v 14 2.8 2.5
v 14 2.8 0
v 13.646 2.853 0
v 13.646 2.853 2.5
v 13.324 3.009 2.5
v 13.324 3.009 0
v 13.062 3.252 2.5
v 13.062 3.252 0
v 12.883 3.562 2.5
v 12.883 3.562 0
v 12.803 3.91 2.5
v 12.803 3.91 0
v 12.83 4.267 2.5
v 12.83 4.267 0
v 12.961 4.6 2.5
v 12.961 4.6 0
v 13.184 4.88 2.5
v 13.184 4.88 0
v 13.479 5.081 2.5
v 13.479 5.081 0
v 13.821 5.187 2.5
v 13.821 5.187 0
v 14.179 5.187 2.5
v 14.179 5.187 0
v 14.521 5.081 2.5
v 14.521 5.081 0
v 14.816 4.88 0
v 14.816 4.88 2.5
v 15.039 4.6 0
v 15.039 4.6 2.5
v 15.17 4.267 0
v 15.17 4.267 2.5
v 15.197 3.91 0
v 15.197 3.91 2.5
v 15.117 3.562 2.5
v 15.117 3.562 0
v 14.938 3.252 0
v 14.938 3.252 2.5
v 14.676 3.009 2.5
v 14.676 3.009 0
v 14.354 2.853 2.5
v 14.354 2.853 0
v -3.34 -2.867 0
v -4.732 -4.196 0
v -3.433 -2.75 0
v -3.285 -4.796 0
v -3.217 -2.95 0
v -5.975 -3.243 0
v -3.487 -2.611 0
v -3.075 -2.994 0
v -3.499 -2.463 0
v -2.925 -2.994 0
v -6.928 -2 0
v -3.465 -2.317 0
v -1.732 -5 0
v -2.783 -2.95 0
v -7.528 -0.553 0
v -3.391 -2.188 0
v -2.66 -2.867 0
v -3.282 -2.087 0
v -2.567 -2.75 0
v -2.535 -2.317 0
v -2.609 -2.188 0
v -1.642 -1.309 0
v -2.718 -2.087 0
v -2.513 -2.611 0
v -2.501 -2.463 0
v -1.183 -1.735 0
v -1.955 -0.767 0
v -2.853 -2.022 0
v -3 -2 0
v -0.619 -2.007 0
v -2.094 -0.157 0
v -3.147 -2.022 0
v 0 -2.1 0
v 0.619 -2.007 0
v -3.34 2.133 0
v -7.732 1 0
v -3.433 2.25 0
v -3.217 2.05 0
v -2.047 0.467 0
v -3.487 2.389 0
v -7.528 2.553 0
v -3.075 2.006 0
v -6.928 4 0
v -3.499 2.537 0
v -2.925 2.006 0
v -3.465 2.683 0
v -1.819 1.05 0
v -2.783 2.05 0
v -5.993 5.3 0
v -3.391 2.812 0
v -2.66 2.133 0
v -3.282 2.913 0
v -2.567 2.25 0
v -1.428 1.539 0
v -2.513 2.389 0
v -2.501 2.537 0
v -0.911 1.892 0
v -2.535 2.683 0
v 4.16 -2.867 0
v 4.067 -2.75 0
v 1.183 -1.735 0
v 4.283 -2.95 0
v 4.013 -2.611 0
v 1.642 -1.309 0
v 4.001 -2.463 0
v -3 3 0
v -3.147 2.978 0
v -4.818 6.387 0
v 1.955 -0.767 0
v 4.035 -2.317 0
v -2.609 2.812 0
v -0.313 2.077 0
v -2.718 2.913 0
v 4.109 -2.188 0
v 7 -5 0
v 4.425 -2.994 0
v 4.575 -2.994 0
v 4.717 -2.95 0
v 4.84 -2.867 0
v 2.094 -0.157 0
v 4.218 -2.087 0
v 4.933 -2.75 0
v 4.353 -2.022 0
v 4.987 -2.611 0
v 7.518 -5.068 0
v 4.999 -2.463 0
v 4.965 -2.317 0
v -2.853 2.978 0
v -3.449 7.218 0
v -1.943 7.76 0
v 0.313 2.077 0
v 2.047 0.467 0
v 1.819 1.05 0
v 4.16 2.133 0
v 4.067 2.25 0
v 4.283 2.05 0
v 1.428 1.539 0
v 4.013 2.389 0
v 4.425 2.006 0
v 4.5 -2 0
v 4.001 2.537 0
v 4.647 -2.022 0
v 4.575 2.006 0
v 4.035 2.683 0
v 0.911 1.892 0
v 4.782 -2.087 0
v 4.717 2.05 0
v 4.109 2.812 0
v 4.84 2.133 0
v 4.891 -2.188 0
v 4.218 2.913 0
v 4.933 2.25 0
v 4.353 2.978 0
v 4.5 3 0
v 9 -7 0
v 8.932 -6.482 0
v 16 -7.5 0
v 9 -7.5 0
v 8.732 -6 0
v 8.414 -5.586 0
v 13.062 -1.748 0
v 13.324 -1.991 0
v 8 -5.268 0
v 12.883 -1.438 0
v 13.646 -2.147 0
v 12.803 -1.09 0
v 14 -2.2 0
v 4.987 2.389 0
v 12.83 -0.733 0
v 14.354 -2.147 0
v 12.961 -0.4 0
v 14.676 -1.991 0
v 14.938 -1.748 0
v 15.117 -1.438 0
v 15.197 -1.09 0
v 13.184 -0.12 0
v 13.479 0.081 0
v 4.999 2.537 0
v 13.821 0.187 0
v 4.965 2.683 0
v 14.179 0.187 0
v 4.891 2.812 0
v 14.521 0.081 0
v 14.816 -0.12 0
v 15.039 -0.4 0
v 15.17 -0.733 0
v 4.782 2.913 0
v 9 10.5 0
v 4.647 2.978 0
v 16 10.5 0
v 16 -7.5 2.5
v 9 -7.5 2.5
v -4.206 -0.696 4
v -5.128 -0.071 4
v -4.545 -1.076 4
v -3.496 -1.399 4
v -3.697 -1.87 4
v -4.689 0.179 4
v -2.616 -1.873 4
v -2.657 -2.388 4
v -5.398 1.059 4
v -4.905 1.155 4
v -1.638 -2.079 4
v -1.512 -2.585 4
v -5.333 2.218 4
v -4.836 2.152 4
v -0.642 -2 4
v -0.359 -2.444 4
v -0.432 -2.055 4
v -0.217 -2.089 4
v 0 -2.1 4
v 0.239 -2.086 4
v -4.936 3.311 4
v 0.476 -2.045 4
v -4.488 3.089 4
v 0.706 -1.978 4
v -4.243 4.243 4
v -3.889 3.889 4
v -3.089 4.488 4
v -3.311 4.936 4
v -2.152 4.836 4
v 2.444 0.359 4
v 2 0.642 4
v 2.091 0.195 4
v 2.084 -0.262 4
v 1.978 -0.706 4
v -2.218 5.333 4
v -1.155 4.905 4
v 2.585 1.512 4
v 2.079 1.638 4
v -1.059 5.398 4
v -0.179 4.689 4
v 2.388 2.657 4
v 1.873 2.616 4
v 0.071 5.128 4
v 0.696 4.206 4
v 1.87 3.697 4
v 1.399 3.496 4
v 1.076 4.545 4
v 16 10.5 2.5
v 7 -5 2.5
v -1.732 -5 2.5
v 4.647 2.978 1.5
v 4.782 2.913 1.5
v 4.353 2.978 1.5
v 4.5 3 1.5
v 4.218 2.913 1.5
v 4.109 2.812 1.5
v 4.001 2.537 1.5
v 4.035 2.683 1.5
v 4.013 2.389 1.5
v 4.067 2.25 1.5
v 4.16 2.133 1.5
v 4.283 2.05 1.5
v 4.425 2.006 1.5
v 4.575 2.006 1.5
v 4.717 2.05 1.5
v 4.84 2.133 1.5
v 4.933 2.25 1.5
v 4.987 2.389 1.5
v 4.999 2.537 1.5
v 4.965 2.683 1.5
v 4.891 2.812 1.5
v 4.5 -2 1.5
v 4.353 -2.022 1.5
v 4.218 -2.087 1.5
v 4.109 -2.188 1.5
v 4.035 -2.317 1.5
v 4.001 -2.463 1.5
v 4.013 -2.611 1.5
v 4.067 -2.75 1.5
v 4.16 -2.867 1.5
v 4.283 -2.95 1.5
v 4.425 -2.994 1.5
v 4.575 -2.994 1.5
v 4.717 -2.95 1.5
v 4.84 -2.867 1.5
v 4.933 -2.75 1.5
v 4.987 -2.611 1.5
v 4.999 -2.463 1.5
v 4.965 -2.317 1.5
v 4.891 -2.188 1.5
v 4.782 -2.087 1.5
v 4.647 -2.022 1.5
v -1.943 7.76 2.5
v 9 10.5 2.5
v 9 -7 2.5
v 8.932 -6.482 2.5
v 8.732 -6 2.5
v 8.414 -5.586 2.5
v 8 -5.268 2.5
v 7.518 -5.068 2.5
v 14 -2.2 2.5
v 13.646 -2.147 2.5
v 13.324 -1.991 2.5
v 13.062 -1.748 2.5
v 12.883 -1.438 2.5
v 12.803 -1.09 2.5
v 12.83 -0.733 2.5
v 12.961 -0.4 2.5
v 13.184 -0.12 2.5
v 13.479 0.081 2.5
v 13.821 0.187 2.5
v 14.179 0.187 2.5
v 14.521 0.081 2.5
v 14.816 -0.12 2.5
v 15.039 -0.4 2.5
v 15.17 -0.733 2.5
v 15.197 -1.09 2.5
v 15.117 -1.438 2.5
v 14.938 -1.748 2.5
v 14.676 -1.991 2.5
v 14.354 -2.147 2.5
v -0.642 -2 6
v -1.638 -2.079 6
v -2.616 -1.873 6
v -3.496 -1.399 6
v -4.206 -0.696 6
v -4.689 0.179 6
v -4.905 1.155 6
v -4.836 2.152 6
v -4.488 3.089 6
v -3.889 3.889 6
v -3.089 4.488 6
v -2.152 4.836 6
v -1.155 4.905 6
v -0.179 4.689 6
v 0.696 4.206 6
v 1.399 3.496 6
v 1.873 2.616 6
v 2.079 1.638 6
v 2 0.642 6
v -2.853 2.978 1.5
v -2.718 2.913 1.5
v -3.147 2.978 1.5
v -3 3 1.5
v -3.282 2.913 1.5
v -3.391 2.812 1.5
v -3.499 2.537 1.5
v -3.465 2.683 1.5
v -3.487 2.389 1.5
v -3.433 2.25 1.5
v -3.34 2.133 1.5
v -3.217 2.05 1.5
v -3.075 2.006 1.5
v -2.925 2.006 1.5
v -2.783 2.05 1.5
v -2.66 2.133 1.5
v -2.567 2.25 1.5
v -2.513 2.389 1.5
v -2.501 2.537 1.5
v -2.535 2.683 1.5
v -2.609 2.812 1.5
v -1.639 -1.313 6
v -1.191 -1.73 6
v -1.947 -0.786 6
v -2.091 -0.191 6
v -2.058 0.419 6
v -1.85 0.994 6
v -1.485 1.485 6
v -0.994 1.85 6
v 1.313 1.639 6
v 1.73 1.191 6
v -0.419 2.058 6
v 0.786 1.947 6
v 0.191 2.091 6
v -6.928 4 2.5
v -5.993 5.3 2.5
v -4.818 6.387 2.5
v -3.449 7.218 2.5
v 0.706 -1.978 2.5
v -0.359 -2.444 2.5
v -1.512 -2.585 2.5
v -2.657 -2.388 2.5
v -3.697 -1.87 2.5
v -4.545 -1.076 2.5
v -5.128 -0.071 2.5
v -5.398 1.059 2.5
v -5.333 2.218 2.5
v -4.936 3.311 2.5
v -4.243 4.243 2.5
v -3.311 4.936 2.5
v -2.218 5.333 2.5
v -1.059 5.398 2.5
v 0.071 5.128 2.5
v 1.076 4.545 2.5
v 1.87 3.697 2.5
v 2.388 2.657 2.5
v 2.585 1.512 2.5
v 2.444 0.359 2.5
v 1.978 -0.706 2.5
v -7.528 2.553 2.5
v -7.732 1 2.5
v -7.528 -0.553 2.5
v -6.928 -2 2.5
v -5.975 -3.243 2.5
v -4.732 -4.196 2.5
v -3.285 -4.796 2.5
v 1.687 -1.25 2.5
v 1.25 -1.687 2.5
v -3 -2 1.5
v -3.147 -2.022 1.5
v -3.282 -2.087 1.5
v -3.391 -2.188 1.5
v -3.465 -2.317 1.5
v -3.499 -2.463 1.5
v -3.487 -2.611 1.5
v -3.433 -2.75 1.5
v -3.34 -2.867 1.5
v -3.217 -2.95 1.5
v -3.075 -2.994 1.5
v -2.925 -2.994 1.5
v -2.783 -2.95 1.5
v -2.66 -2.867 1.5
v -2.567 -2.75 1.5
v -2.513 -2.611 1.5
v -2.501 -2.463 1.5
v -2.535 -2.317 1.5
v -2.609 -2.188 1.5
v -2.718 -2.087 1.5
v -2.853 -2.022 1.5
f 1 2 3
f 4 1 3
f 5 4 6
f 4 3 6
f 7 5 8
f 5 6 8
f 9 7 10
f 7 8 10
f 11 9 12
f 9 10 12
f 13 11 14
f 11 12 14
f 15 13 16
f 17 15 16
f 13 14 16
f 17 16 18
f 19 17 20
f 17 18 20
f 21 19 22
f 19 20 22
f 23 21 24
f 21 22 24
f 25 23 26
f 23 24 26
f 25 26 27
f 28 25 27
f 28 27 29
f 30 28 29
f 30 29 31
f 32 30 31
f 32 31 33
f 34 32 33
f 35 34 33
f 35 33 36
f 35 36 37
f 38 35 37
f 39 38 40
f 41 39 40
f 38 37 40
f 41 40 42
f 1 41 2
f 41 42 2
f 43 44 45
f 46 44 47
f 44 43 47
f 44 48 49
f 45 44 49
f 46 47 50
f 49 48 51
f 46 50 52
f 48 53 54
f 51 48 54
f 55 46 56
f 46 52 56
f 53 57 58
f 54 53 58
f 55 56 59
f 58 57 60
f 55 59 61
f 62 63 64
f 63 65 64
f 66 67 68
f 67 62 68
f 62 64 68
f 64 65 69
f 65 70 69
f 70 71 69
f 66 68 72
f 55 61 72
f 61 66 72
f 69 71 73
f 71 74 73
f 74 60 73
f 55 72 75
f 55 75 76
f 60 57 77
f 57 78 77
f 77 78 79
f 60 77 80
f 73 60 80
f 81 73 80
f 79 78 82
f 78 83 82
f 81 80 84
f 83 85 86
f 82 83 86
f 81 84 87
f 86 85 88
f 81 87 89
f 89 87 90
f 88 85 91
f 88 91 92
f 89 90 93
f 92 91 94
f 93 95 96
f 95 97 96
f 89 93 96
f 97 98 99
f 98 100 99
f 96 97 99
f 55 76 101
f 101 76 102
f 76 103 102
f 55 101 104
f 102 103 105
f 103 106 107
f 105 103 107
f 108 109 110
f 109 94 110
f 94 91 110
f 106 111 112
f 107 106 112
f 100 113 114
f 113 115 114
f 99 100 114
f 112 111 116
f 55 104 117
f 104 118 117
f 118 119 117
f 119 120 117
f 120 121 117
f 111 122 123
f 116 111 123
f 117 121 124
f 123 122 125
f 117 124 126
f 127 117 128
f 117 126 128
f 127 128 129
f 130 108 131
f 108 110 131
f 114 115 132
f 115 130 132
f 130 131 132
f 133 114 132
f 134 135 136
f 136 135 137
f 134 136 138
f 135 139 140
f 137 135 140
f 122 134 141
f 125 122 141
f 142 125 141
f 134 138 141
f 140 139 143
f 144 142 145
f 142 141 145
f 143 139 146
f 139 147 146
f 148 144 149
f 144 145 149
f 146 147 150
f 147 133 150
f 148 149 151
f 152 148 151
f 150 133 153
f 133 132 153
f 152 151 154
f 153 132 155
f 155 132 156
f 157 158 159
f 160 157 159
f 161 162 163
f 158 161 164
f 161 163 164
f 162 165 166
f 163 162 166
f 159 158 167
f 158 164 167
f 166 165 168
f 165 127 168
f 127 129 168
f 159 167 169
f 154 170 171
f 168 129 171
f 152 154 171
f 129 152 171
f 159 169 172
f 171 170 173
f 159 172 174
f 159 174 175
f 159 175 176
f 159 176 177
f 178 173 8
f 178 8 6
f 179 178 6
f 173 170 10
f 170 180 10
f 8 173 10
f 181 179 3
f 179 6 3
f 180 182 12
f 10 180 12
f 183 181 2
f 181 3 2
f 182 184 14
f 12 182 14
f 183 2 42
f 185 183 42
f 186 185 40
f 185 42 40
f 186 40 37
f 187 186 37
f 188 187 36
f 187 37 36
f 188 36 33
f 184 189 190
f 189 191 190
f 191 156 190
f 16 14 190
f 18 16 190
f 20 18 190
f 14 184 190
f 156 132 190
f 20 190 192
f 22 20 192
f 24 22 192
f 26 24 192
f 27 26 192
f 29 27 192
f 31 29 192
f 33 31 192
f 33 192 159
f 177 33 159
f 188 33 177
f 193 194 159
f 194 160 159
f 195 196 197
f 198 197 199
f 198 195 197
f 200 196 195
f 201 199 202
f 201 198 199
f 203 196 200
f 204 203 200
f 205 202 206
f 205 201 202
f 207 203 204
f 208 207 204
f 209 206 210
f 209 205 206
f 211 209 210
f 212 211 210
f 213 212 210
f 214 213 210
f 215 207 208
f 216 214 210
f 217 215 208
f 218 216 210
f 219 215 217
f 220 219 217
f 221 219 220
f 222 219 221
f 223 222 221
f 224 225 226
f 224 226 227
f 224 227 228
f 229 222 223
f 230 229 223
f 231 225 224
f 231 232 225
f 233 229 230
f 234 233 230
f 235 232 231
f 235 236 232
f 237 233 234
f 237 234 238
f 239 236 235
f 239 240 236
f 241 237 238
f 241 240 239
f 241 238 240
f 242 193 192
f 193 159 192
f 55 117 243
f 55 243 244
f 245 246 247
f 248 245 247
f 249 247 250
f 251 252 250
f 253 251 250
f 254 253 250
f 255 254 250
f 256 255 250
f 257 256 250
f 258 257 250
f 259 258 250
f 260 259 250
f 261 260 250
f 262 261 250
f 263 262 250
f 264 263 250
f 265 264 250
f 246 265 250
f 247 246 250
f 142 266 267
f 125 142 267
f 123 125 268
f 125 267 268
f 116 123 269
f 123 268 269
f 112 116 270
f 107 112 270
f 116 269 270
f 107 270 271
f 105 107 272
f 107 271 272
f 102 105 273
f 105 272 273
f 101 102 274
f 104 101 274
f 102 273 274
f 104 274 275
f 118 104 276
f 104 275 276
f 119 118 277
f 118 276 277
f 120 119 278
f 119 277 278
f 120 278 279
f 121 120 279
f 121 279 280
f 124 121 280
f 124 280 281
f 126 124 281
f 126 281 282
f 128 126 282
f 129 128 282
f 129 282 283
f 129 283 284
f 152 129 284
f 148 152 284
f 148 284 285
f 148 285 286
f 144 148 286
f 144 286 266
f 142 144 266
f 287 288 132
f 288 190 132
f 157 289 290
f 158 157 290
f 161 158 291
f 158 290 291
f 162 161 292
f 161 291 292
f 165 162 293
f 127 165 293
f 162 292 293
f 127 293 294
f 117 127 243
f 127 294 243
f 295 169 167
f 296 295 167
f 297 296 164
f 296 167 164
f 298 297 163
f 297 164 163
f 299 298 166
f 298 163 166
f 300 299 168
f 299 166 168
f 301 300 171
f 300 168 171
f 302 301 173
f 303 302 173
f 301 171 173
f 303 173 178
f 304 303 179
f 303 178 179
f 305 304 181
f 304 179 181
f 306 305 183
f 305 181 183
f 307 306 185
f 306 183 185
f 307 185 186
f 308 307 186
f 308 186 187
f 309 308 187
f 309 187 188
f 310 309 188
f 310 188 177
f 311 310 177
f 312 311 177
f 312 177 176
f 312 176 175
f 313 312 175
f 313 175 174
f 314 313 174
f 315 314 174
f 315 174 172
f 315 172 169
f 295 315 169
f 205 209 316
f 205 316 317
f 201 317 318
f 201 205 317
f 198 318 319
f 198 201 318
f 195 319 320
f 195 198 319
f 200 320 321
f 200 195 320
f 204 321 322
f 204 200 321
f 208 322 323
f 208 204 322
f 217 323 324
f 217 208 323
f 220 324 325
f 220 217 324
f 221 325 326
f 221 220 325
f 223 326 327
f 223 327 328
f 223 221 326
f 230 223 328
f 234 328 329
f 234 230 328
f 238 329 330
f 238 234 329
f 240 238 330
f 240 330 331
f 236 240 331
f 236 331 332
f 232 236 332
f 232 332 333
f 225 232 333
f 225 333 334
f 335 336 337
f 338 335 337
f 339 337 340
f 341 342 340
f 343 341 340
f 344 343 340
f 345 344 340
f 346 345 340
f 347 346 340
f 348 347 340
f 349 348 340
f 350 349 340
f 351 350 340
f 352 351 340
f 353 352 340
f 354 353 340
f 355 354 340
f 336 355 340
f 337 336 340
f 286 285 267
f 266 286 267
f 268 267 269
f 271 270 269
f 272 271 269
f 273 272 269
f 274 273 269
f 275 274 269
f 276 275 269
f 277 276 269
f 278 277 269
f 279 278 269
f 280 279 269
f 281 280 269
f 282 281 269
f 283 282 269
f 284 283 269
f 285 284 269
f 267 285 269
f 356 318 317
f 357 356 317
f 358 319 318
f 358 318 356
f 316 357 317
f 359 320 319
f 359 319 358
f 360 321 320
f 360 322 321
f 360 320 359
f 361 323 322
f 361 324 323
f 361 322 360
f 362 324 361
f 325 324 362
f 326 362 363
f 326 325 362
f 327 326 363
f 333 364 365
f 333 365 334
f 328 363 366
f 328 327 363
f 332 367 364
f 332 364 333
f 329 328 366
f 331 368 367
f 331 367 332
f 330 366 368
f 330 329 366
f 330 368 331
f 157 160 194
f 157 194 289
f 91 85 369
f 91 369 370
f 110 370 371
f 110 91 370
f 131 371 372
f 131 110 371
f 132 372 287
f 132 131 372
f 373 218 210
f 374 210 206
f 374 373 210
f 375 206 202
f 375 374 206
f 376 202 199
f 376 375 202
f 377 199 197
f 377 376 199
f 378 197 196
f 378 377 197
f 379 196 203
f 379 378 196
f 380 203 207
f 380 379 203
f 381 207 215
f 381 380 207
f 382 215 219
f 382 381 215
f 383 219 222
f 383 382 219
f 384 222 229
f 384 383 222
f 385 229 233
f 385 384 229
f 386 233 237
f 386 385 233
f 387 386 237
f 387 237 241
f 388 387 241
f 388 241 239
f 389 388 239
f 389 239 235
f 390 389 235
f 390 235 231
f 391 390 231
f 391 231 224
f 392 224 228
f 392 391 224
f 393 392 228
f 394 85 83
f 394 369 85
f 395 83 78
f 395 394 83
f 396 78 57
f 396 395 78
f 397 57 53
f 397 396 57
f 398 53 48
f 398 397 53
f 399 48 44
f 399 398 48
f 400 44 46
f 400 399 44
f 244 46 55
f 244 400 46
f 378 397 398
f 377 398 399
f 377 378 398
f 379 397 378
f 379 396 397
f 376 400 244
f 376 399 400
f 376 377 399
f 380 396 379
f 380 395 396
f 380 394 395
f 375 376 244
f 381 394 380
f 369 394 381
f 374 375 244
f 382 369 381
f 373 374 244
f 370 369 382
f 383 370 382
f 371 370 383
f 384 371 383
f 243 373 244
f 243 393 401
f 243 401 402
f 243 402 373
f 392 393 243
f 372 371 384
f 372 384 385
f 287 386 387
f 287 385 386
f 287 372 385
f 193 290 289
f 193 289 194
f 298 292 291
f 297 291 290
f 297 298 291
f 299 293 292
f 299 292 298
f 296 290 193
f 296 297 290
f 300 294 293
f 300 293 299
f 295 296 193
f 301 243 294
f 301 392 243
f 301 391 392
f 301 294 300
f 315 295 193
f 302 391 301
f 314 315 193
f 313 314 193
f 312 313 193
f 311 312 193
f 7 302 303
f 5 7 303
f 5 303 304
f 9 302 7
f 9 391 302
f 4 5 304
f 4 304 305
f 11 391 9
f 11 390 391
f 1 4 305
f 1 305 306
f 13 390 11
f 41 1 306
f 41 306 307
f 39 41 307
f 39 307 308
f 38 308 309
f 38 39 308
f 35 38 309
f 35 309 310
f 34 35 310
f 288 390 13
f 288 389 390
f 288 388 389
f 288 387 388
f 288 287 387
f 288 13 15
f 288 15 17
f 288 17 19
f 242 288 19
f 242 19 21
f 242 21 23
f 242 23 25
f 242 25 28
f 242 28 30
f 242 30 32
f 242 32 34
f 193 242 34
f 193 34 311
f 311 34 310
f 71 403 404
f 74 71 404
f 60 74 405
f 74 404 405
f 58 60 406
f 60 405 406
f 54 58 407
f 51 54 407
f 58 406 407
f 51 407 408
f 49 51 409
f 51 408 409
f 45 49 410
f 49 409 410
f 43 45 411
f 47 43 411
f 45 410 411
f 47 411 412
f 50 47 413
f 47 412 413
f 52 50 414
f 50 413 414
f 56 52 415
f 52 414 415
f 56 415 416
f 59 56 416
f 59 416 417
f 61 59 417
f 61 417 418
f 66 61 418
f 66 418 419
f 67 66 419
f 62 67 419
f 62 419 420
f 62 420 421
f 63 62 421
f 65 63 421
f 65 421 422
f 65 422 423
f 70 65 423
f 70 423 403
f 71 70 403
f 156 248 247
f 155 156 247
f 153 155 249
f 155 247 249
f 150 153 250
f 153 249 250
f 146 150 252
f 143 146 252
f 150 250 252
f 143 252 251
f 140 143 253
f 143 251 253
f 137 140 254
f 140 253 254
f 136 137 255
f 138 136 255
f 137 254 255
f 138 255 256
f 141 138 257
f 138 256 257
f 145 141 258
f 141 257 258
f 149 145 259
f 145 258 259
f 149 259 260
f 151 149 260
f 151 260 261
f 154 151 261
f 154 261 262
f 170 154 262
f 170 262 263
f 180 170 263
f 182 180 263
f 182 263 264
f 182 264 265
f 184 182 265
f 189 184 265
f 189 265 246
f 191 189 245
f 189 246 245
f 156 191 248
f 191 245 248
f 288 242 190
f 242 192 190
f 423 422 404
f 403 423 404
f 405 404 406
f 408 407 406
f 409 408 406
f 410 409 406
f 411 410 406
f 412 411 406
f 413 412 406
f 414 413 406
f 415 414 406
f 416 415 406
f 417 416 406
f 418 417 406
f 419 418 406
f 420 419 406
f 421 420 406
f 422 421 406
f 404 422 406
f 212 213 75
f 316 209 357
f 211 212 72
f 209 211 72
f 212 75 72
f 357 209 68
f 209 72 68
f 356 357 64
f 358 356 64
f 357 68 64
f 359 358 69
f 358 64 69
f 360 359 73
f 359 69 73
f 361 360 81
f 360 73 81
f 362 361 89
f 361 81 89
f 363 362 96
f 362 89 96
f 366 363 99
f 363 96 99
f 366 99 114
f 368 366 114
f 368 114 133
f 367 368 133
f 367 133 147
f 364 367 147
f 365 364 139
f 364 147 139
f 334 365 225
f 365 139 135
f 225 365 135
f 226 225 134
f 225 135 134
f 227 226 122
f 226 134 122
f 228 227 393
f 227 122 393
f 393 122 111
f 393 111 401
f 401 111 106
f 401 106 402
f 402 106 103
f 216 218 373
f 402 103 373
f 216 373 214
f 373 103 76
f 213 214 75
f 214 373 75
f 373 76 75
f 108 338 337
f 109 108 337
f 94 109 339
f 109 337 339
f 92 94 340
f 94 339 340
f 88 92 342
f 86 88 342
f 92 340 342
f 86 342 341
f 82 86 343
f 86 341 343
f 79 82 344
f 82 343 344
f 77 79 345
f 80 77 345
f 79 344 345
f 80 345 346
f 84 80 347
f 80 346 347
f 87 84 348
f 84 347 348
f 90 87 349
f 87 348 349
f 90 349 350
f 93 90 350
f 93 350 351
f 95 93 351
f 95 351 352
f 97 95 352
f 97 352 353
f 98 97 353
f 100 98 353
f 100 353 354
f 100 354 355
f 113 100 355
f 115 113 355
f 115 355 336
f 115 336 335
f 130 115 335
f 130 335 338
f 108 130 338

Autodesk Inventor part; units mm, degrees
ref_plane "YZ Plane" through (0, 0, 0) normal (1, 0, 0) x (0, 1, 0)
ref_plane "XZ Plane" through (0, 0, 0) normal (0, 1, 0) x (-1, 0, 0)
ref_plane "XY Plane" through (0, 0, 0) normal (0, 0, 1) x (1, 0, 0)
sketch "MCP joint" plane through (0, 0, 0) normal (0, 0, 1) x (1, 0, 0)
  point P0 (0, 0)
  point P1 (0, 0)
sketch "Sketch2" plane through (0, 0, 0) normal (0, 0, 1) x (1, 0, 0)
  line L0 (9, -7.5) -> (16, -7.5)
  line L1 (16, -7.5) -> (16, 10.5)
  line L2 (16, 10.5) -> (9, 10.5)
  circle A0 centre (0, 0) radius 8
  line L3 (9, 10.5) -> (-1.9428, 7.7605)
  line L4 (9, -7.5) -> (0.4552, -7.987)
  point P0 (16, 1.5)
  point P1 (3.5, 1.5)
  point P2 (16, 1.5)
  dimension "d0" = 18
  dimension "d3" = 16
  dimension "d94" = 1.5
  dimension "d95" = 16
  dimension "d96" = 9
  dimension "d97" = 9
extrude "base" add sketch "Sketch2" along normal blind 2.5
sketch "Sketch3" plane through (0, 0, 2.5) normal (0, 0, 1) x (1, 0, 0)
  point P0 (0, 0)
  point P1 (0, 0)
hole "bearing pocket" at (0, 0, 2.5) direction (0, 0, -1) diameter 4 end through all
sketch "Sketch13" plane through (0, 0, 0) normal (0, 0, -1) x (-1, 0, 0)
  line L0 (-9, -7.5) -> (-9, -5)
  arc A0 (-0.4552, -7.987) -> (1.9428, 7.7605) centre (0, 0) ccw projected
  line L1 (-9, -5) -> (6.245, -5)
  line L2 (-0.4552, -7.987) -> (-9, -7.5) projected
  dimension "d76" = 2.5
extrude "bottom cutout" cut sketch "Sketch13" against normal through all
fillet "Fillet2" radius 2 1 edges at (9, -5, 1.25)
fillet "Fillet4" radius 6 1 edges at (-6.245, -5, 1.25)
sketch "Sketch7" plane through (0, 0, 0) normal (0, 0, -1) x (-1, 0, 0)
  line L0 (3, 2.5) -> (-4.5, 2.5) construction
  line L1 (-4.5, 2.5) -> (-4.5, -2.5) construction
  line L2 (-4.5, -2.5) -> (3, -2.5) construction
  line L3 (3, -2.5) -> (3, 2.5) construction
  line L4 (3, 2.5) -> (-4.5, -2.5) construction
  line L5 (-4.5, 2.5) -> (3, -2.5) construction
  point P0 (0, 0)
  point P1 (-0.75, 0)
  point P2 (0, 0)
  point P3 (-0.75, 0)
  dimension "d34" = 3
  dimension "d35" = 4.5
  dimension "d36" = 5
hole "potentiometer pins" at (-3, 2.5, 0) at (-3, -2.5, 0) at (4.5, -2.5, 0) at (4.5, 2.5, 0) direction (0, 0, 1) diameter 1 depth 1.5
sketch "Sketch8" plane through (0, 0, 2.5) normal (0, 0, 1) x (1, 0, 0)
  line L0 (8.1428, 0) -> (0, 0) construction
  line L1 (0, 0) -> (-8.8782, 8.8782) construction
  circle A0 centre (-1.4142, 1.4142) radius 3.5
  dimension "d45" = 2
  dimension "d46" = 7
  dimension "d59" = 45
extrude "bearing" add sketch "Sketch8" along normal blind 3.5
sketch "Sketch10" plane through (0, 0, 2.5) normal (0, 0, 1) x (1, 0, 0)
  circle A0 centre (-1.4142, 1.4142) radius 3.5 projected
  circle A1 centre (-1.4142, 1.4142) radius 4
  point P0 (0, 0)
  point P1 (1.0607, -1.0607)
  dimension "d56" = 8
extrude "bearing spacer" add sketch "Sketch10" along normal blind 1.5
sketch "Sketch11" plane through (-1.4142, 1.4142, 6) normal (0, 0, 1) x (1, 0, 0)
  point P0 (1.4142, -1.4142)
  point P1 (1.4142, -1.4142)
hole "Hole4" at (0, 0, 6) direction (0, 0, -1) diameter 4.2 end through all
sketch "Sketch12" plane through (0, 0, 2.5) normal (0, 0, 1) x (1, 0, 0)
  point P0 (0, 0)
  point P1 (14, 4)
  point P2 (14, -1)
  point P3 (0, 0)
  dimension "d88" = 14
  dimension "d89" = 14
  dimension "d90" = 4
  dimension "d91" = 1
hole "mounting" at (14, 4, 2.5) at (14, -1, 2.5) direction (0, 0, -1) diameter 2.4 end through all
equation "\"d45\" = MCP_spring_arm"
equation "\"MCP_spring_arm\" = F5_MCP_spring_arm"
equation "\"F5_MCP_spring_arm\" = 2"
properties part number "MCP mount M F5"
